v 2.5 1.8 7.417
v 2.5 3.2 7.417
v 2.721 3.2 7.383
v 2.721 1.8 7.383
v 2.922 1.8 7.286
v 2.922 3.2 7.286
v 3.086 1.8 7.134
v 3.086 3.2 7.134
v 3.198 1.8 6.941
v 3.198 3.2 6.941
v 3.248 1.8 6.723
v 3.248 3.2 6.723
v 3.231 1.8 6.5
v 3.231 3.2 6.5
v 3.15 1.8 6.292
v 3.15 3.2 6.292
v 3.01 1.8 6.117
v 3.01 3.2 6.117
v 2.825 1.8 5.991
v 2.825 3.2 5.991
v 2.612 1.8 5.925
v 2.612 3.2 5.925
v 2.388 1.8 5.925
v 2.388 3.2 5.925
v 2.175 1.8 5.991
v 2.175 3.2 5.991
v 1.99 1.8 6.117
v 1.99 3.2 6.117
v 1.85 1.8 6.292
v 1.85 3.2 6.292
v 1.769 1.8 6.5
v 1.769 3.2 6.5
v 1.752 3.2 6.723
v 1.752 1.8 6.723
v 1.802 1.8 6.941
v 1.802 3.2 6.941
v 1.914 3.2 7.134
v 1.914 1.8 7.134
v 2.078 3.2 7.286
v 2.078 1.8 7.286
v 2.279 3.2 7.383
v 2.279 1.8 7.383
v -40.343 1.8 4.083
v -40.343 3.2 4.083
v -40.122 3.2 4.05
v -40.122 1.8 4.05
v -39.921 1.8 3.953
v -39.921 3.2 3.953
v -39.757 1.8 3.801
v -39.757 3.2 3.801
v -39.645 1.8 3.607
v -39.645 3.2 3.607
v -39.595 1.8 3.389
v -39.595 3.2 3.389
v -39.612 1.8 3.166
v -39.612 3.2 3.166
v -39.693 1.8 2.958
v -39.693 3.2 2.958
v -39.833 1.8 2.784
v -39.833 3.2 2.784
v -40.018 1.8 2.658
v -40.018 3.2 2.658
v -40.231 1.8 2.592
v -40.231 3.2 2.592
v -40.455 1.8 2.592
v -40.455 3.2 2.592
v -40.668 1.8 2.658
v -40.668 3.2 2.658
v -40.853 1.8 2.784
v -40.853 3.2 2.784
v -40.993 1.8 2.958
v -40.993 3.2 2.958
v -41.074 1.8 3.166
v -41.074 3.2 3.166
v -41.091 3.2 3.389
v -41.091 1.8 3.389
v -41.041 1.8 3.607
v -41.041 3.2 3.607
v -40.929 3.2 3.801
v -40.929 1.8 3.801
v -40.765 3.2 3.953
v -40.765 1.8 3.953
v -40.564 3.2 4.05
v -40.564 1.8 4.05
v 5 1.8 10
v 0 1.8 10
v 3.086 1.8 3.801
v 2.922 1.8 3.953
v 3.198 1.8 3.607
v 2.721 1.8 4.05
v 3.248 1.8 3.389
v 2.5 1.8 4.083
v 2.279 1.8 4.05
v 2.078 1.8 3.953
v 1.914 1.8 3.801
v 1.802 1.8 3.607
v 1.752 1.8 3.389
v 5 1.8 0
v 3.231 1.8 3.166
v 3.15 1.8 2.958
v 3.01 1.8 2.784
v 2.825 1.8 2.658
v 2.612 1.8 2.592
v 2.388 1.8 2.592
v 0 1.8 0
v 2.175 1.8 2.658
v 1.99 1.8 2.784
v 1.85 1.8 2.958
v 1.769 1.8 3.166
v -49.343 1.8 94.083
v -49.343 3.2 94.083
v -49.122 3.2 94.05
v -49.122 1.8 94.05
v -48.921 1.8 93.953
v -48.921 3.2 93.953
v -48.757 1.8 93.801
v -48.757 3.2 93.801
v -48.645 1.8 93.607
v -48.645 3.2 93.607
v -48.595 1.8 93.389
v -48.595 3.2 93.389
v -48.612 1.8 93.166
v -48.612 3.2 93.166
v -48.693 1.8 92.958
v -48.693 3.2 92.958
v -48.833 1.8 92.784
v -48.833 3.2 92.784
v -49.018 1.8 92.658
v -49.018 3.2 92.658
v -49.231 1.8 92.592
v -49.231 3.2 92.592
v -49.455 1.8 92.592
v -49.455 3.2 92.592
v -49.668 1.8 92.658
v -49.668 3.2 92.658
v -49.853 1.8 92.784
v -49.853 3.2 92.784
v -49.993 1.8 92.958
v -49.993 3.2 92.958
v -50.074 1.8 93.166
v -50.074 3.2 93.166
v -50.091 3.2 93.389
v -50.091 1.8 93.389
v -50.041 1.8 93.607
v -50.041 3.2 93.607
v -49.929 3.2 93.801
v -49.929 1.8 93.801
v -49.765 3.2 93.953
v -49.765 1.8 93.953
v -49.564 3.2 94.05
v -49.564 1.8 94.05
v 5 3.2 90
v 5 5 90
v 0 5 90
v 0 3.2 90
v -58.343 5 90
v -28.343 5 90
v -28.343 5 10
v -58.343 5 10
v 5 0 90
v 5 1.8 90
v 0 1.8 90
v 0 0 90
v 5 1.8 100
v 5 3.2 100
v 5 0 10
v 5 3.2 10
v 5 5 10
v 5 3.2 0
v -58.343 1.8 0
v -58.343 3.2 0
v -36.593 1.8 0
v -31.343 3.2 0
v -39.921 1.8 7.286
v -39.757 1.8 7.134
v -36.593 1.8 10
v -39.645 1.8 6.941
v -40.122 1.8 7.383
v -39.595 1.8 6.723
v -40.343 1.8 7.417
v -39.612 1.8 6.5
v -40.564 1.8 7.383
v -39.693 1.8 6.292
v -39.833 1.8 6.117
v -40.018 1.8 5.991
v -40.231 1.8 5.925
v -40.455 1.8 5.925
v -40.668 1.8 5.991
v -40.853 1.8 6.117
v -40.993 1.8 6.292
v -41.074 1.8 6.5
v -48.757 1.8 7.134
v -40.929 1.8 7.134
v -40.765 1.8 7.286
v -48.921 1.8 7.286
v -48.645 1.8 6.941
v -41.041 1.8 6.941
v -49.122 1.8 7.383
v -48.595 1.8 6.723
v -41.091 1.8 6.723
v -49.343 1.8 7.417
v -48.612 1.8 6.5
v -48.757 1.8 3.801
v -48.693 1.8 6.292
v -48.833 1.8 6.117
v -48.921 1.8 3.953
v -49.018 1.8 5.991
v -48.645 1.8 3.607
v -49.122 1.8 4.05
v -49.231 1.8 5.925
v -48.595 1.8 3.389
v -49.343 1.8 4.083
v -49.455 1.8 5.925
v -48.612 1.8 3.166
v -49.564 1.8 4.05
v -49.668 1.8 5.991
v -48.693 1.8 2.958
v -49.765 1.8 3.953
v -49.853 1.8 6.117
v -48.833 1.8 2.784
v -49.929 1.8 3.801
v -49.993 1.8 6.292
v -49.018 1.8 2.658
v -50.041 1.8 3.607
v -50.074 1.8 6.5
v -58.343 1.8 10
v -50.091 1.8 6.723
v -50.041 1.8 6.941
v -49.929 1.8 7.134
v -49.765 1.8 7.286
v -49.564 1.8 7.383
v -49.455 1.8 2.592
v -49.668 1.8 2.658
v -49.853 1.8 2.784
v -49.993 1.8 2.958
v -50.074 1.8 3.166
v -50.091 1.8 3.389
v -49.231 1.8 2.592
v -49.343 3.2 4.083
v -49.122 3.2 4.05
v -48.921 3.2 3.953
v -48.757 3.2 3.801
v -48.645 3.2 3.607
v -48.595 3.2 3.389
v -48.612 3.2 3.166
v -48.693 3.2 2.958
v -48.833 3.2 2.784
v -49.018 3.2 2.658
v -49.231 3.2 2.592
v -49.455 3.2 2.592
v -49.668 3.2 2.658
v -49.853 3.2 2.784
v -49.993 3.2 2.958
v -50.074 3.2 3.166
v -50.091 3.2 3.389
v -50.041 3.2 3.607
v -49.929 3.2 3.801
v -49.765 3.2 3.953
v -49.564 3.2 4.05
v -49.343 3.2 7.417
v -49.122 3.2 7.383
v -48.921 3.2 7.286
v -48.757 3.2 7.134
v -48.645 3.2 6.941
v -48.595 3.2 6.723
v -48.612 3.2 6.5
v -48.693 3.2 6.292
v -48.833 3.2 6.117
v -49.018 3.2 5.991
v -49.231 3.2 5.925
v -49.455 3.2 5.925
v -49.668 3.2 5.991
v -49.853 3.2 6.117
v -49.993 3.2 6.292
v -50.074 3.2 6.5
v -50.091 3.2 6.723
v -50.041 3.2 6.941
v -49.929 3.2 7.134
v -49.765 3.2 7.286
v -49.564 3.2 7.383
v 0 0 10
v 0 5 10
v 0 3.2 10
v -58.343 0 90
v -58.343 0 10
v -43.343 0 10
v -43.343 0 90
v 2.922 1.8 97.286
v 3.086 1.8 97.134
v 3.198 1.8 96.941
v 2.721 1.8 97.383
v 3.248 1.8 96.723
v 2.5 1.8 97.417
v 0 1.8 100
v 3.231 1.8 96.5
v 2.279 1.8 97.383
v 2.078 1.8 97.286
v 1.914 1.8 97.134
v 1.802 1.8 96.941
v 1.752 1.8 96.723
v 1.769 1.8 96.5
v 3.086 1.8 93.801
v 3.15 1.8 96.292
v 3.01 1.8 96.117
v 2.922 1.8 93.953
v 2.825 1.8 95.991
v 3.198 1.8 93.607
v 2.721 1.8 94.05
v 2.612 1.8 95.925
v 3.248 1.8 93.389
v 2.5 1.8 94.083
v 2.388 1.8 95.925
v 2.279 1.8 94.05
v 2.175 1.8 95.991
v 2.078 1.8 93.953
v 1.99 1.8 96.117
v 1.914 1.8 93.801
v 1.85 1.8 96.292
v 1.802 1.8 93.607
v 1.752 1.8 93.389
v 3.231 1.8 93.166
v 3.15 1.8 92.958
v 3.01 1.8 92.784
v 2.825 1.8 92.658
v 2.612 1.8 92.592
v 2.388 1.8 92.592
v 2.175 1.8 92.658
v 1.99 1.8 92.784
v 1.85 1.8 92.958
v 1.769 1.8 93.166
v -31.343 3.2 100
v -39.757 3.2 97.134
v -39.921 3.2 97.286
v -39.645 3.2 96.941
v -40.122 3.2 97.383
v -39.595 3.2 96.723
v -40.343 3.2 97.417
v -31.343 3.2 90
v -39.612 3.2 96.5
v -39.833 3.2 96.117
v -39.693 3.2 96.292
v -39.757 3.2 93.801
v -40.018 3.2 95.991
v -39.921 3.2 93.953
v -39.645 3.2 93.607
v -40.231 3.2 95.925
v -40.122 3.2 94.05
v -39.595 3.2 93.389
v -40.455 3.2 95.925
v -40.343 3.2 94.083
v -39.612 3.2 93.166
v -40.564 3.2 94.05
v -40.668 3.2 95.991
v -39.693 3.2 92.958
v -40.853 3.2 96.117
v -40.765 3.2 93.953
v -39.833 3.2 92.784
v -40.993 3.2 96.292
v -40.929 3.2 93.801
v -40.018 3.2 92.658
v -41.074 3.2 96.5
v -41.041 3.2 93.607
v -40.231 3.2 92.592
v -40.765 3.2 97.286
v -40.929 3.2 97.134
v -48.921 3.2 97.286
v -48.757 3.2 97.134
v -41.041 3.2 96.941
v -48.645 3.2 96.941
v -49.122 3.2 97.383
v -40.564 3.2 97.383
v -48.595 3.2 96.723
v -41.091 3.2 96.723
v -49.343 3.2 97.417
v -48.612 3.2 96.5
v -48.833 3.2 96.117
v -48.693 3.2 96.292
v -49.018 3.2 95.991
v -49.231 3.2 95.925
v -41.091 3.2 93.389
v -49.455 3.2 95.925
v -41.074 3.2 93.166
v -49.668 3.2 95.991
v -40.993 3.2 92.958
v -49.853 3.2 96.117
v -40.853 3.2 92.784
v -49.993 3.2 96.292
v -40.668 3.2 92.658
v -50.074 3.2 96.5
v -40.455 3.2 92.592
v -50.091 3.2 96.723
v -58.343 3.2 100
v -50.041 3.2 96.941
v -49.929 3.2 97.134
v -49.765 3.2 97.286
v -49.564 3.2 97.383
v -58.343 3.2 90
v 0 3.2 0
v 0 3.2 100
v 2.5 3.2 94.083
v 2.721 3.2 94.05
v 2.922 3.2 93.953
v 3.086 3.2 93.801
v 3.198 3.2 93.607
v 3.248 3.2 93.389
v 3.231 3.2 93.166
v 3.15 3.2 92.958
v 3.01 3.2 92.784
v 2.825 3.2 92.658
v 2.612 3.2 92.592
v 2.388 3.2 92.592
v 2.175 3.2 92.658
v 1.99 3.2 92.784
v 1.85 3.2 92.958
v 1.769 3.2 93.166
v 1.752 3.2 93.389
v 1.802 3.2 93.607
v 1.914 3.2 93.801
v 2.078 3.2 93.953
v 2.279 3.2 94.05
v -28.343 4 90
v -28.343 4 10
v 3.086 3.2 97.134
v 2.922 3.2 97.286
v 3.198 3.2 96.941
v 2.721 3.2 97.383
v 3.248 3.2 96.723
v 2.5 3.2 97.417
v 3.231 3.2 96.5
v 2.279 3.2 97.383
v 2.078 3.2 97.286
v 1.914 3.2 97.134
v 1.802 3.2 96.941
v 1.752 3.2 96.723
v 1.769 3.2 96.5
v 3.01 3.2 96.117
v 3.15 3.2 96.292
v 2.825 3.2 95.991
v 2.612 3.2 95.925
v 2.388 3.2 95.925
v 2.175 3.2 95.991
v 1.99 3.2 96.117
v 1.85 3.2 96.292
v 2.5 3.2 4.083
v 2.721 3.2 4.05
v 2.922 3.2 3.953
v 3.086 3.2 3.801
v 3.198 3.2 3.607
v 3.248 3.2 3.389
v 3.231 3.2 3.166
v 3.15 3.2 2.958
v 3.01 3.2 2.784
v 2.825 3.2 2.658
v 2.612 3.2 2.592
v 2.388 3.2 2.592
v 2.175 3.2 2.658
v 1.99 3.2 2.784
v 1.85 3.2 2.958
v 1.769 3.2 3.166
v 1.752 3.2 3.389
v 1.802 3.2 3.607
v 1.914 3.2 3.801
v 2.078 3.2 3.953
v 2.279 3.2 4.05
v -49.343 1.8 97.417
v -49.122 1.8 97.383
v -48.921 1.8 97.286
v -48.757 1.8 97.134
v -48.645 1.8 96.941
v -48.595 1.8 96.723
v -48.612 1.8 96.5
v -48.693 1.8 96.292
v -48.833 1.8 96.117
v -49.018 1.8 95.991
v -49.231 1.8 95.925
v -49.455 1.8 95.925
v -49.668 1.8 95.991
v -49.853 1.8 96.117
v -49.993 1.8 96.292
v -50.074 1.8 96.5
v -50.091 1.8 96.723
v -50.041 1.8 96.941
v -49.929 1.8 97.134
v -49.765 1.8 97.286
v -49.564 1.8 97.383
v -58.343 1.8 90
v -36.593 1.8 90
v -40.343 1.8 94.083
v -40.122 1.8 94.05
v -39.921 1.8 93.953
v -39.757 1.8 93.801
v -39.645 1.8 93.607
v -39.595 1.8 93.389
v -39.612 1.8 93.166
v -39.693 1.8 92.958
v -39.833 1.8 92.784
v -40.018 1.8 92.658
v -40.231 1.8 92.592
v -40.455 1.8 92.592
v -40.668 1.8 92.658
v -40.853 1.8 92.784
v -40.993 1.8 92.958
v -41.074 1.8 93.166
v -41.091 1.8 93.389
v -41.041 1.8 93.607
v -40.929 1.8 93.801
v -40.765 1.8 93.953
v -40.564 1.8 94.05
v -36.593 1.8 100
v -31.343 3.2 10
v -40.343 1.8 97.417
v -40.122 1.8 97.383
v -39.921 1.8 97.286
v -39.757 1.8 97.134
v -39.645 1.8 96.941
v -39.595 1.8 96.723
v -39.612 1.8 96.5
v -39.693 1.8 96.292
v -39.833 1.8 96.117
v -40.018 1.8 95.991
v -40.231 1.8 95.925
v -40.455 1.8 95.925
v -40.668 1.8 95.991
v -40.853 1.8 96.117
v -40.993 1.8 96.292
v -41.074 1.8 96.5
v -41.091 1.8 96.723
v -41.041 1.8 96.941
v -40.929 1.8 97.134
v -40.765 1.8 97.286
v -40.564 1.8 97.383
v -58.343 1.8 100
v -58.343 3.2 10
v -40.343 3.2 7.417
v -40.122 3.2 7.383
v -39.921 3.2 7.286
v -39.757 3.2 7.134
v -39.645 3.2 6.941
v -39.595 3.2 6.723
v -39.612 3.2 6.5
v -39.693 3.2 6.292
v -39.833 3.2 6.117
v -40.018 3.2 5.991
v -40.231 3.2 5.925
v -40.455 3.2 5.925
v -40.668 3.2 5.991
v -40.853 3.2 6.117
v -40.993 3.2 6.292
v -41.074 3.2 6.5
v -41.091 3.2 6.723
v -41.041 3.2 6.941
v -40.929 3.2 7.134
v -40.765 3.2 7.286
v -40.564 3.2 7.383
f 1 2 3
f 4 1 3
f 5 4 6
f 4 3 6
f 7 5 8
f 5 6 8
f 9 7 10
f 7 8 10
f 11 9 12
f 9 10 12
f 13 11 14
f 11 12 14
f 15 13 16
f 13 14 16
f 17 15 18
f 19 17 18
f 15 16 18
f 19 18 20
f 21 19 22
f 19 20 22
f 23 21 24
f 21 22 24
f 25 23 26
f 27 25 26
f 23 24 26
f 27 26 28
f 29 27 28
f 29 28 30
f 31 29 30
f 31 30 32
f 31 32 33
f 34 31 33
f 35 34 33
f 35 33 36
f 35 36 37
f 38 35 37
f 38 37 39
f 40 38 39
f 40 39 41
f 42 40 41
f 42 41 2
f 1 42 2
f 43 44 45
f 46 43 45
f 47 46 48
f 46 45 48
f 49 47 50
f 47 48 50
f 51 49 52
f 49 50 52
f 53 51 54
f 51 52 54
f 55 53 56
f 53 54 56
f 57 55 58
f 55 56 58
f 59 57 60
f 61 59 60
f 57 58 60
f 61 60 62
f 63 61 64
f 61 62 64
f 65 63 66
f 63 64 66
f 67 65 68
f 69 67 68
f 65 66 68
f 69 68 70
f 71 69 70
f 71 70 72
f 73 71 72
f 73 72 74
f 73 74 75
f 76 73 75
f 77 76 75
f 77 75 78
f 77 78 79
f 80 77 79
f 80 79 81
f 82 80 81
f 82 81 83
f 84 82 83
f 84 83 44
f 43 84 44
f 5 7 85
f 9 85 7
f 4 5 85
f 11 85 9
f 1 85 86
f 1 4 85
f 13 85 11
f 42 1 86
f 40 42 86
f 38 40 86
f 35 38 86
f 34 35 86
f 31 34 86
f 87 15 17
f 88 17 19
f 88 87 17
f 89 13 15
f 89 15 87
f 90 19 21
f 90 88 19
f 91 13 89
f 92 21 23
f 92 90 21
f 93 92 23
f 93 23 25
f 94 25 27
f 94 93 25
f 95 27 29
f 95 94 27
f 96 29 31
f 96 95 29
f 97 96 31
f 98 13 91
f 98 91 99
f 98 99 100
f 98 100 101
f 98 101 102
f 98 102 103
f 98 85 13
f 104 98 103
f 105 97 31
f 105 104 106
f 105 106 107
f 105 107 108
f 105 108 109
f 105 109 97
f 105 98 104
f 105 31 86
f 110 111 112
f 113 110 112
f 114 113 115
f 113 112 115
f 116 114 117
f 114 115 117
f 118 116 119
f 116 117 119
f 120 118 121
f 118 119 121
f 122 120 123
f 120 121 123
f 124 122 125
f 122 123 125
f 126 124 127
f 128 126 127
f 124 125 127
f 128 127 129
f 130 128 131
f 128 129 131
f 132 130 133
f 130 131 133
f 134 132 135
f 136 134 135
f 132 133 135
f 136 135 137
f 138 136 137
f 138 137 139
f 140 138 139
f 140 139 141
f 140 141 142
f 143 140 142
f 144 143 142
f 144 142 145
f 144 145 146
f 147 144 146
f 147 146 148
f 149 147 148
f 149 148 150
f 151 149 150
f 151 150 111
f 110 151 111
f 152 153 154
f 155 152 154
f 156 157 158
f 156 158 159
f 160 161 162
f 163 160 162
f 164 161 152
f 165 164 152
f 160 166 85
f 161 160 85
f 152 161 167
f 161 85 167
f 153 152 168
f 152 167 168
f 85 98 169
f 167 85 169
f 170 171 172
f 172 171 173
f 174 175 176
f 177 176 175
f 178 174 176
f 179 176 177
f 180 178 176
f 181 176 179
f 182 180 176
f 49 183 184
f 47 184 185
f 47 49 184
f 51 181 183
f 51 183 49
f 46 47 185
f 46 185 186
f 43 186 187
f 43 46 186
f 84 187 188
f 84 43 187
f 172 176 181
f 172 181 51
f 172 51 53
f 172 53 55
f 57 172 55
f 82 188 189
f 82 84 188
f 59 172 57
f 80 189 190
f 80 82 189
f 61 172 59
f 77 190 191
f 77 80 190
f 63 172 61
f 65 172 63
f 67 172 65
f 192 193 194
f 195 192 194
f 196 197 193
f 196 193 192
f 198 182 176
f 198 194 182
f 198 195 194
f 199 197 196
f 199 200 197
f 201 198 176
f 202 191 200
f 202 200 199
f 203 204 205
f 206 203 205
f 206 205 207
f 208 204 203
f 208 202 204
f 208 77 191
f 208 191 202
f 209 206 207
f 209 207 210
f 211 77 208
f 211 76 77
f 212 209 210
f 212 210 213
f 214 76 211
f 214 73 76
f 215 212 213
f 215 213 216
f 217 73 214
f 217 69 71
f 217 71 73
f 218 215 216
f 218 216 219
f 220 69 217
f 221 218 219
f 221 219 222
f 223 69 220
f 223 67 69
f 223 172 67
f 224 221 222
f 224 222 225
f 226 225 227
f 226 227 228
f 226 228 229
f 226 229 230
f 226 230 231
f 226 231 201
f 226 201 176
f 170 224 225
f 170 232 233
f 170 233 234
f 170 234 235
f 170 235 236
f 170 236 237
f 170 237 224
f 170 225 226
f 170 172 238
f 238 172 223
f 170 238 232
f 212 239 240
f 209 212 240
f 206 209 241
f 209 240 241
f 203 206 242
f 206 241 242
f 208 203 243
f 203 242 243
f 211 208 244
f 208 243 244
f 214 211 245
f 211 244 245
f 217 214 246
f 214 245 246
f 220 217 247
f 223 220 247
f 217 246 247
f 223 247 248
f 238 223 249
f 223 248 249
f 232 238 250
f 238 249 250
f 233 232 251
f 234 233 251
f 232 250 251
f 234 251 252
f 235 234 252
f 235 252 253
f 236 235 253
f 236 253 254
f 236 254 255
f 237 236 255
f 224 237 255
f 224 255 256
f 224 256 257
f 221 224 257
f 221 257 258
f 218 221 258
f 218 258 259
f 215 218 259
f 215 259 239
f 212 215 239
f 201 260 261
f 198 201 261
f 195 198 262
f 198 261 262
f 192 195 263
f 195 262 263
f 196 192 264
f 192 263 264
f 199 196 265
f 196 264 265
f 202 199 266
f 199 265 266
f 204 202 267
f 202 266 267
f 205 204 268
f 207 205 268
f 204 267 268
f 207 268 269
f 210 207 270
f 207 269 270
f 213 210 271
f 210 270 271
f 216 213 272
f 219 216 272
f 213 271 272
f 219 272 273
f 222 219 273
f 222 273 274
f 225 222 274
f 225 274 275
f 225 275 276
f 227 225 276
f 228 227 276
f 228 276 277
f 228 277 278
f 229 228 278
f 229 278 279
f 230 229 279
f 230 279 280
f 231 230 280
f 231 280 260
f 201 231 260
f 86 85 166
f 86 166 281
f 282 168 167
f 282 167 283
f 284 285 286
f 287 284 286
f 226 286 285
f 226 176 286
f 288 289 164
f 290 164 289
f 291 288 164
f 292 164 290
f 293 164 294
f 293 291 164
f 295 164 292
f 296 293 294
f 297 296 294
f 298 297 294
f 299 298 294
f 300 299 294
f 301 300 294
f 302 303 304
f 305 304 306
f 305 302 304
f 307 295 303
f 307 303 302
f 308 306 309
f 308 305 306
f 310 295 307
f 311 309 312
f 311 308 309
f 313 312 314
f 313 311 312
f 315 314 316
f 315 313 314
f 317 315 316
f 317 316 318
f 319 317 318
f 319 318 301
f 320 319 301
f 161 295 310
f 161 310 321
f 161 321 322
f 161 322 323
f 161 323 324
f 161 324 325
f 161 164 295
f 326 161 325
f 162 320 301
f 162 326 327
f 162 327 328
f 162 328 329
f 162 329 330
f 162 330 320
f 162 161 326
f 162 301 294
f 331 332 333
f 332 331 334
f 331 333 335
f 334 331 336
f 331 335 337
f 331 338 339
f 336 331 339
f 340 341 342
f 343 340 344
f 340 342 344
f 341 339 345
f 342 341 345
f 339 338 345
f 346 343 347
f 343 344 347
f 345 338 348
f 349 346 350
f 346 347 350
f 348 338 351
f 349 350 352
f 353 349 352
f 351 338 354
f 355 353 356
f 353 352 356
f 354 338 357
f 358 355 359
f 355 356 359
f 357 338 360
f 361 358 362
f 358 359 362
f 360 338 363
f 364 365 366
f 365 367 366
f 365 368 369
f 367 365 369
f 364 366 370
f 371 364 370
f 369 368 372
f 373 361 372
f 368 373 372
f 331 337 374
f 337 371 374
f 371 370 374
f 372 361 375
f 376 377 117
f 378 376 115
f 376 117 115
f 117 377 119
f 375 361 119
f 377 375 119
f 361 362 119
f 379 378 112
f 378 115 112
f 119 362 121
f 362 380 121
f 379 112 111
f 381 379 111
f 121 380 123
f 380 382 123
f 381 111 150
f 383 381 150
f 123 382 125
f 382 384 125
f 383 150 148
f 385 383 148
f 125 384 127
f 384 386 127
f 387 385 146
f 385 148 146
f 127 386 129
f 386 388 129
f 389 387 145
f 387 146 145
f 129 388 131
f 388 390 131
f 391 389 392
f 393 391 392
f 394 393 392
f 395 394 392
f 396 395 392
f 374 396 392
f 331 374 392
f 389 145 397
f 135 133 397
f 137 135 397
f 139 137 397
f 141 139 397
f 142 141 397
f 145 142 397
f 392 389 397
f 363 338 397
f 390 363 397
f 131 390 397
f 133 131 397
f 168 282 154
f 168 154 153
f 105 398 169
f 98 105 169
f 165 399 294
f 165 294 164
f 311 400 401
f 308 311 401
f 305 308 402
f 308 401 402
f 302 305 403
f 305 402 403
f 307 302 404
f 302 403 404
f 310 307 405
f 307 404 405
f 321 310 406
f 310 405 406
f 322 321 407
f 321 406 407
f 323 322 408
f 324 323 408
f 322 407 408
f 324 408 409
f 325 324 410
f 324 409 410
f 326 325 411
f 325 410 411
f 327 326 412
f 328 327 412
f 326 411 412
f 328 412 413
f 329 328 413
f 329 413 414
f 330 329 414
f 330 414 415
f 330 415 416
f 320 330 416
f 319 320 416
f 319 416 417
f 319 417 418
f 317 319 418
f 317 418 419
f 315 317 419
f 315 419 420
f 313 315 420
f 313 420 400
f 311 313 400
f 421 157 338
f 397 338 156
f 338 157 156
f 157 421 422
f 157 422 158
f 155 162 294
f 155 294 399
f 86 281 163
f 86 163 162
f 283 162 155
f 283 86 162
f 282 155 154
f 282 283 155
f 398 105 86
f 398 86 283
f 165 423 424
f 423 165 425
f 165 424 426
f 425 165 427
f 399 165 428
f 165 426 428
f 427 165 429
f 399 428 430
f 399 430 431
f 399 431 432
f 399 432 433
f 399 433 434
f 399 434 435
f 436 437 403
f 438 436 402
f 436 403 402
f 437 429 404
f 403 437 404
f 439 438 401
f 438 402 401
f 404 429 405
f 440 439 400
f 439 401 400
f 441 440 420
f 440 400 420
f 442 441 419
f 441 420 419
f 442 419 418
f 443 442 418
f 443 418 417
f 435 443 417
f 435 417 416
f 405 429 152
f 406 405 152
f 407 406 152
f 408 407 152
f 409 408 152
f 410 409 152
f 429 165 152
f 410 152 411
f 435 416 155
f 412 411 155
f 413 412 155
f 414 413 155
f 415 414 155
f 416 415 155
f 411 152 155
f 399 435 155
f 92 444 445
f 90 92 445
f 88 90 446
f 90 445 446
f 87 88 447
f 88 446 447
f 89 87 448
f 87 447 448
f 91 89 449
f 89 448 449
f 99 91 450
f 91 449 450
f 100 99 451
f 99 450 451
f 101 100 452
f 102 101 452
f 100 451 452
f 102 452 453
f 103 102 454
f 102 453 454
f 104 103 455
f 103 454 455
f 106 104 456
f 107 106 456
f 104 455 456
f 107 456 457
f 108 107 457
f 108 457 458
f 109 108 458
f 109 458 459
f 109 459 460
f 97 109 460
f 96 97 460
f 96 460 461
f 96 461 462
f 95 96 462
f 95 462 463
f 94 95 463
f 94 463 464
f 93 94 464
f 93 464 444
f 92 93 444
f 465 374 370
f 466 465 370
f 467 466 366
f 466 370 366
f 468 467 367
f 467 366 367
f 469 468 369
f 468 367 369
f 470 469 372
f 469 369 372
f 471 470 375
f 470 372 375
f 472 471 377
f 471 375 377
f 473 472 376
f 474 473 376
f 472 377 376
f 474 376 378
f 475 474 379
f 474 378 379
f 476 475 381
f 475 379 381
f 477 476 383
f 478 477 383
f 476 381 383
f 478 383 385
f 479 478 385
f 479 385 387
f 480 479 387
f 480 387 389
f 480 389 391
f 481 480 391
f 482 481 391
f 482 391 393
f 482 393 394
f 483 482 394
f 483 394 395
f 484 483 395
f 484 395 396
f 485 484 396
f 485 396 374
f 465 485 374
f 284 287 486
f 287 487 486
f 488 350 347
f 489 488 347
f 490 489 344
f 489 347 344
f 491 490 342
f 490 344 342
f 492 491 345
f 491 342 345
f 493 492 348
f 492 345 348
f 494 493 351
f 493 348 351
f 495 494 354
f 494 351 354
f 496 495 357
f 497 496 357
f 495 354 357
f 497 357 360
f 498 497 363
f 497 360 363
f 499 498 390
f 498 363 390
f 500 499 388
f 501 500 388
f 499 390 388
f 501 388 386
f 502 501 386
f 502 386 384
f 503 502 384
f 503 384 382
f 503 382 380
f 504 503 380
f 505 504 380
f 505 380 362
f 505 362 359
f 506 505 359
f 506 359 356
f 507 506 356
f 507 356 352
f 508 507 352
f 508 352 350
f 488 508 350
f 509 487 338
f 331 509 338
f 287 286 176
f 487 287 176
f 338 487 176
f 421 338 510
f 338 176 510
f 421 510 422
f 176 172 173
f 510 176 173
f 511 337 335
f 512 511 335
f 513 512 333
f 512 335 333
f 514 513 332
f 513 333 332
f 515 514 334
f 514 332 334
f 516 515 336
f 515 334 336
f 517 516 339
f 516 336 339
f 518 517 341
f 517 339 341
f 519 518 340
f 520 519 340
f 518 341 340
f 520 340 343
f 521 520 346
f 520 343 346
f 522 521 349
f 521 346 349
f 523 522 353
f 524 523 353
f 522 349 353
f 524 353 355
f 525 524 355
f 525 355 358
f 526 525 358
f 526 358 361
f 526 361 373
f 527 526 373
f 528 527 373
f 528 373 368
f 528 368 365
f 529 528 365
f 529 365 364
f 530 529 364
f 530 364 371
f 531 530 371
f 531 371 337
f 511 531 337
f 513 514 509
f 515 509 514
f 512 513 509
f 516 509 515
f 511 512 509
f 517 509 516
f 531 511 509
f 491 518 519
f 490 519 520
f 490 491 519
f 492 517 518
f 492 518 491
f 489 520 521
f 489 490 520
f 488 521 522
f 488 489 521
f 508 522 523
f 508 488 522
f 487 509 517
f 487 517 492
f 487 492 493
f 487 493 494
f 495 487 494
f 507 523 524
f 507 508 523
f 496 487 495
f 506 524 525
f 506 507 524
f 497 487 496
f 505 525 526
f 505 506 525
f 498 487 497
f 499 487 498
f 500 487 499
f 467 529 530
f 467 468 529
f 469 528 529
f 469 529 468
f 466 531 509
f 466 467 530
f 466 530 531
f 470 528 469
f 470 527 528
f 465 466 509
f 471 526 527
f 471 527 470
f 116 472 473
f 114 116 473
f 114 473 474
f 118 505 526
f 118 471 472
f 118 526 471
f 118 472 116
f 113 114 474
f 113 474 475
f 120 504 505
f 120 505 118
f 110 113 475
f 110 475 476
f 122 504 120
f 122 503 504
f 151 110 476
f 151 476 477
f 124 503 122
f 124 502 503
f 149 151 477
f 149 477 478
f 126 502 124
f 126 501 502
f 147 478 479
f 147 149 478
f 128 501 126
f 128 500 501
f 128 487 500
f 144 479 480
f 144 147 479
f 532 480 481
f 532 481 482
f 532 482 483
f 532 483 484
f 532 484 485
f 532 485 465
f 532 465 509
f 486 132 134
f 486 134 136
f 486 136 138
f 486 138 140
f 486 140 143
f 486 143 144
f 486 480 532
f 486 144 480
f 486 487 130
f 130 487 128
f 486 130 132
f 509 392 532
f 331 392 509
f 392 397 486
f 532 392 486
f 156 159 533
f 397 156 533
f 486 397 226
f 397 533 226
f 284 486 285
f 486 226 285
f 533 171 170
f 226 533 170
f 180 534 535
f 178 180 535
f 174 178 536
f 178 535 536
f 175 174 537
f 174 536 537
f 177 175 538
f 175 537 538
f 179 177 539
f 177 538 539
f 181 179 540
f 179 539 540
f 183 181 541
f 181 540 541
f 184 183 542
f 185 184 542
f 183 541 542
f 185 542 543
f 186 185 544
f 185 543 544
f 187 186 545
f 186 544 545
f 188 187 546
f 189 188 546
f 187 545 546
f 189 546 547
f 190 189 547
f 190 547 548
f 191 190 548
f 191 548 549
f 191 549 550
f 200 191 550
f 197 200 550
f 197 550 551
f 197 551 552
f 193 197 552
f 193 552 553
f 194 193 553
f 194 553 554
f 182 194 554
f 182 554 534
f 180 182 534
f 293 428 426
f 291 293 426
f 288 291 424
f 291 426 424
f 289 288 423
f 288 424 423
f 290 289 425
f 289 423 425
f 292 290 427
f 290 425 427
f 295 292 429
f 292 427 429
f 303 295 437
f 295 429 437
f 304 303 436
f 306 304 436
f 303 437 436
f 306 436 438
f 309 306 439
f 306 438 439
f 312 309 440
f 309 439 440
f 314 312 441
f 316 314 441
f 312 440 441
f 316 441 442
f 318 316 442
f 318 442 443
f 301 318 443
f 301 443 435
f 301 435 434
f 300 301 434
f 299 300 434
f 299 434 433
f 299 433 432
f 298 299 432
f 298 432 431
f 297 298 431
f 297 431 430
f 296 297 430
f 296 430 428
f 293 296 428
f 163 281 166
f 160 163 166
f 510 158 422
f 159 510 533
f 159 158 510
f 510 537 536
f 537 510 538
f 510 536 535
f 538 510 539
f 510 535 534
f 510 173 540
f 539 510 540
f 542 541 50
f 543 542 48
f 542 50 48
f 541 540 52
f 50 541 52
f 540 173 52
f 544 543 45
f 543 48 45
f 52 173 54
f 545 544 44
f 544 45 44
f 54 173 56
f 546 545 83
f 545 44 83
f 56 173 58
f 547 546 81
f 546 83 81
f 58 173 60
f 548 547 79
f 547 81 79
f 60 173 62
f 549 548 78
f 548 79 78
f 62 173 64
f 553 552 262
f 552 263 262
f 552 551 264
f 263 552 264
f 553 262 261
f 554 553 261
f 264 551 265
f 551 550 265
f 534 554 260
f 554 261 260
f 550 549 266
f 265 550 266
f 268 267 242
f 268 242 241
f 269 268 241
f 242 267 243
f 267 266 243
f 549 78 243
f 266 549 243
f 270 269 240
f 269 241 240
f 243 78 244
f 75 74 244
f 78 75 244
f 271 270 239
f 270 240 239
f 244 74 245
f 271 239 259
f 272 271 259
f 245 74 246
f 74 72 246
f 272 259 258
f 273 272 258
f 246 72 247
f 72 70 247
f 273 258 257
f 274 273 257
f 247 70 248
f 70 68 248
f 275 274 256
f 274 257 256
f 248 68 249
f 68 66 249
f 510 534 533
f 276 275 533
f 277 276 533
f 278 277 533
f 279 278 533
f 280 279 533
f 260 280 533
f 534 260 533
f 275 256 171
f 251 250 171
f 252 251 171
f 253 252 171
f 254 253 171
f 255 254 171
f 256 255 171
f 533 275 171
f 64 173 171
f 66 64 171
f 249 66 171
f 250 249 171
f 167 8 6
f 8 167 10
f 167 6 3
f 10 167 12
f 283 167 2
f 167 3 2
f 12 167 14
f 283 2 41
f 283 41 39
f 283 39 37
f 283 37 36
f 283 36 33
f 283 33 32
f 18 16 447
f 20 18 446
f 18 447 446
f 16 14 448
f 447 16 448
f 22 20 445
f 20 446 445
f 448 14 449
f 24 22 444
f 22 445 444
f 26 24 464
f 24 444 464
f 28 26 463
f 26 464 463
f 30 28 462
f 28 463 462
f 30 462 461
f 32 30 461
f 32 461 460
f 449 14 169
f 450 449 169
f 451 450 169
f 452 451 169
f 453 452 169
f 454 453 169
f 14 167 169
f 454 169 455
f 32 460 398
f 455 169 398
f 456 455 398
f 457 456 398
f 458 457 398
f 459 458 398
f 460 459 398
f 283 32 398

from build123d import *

# Parameters (mm, degrees)
AUFSATZ_LINEAR_AUSTRAGEN1_DEPTH   = 100
SKIZZE1_W                         = 5
SKIZZE1_H                         = 5
AUFSATZ_LINEAR_AUSTRAGEN1_2_DEPTH = 100
SKIZZE3_W                         = 63.343006578
SKIZZE3_H                         = 1.8
SCHNITT_LINEAR_AUSTRAGEN2_DEPTH   = 10
SCHNITT_LINEAR_START              = -90
SKIZZE3_3_W                       = 63.343006578
SKIZZE3_3_H                       = 1.8
SCHNITT_LINEAR_AUSTRAGEN3_DEPTH   = 10
SKIZZE4_R                         = 0.75
SCHNITT_LINEAR_AUSTRAGEN4_DEPTH   = 3.2
LINEARES_MUSTER1_COUNT            = 2
LINEARES_MUSTER1_PITCH            = 90


with BuildPart() as part:
    # Skizze1 → Aufsatz-Linear austragen1 (new body)
    with BuildSketch(Plane.XY):
        Polygon((-43.343006578, 0), (-28.343006578, 4), (-28.343006578, 5), (-58.343006578, 5), (-58.343006578, 0), align=None)
    extrude(amount=AUFSATZ_LINEAR_AUSTRAGEN1_DEPTH)


with BuildPart() as body_2:
    # Skizze1 → Aufsatz-Linear austragen1 2 (new body)
    with BuildSketch(Plane.XY):
        with Locations((2.5, 2.5)):
            Rectangle(SKIZZE1_W, SKIZZE1_H)
    extrude(amount=AUFSATZ_LINEAR_AUSTRAGEN1_2_DEPTH)


with BuildPart() as schnitt_linear_austragen2_tool:
    # Skizze3 → Schnitt-Linear austragen2 (new body)
    with BuildSketch(Plane(origin=(0, 0, 0), x_dir=(-1, 0, 0), z_dir=(0, 0, -1))):
        with Locations((26.671503289, 4.1)):
            Rectangle(SKIZZE3_W, SKIZZE3_H)
        with Locations((26.671503289, 0.9)):
            Rectangle(SKIZZE3_W, SKIZZE3_H)
    extrude(amount=-SCHNITT_LINEAR_AUSTRAGEN2_DEPTH)


with BuildPart() as part_1:
    add(part.part)

    # Schnitt-Linear austragen2: cut by schnitt_linear_austragen2_tool
    add(schnitt_linear_austragen2_tool.part, mode=Mode.SUBTRACT)


with BuildPart() as body_2_1:
    add(body_2.part)

    # Schnitt-Linear austragen2: cut by schnitt_linear_austragen2_tool
    add(schnitt_linear_austragen2_tool.part, mode=Mode.SUBTRACT)


with BuildPart() as schnitt_linear_austragen3_tool:
    # Skizze3<3> → Schnitt-Linear austragen3 (new body)
    with BuildSketch(Plane(origin=(0, 0, 0), x_dir=(-1, 0, 0), z_dir=(0, 0, -1)).offset(SCHNITT_LINEAR_START)):
        with Locations((26.671503289, 4.1)):
            Rectangle(SKIZZE3_3_W, SKIZZE3_3_H)
        with Locations((26.671503289, 0.9)):
            Rectangle(SKIZZE3_3_W, SKIZZE3_3_H)
    extrude(amount=-SCHNITT_LINEAR_AUSTRAGEN3_DEPTH)


with BuildPart() as part_2:
    add(part_1.part)

    # Schnitt-Linear austragen3: cut by schnitt_linear_austragen3_tool
    add(schnitt_linear_austragen3_tool.part, mode=Mode.SUBTRACT)


with BuildPart() as body_2_2:
    add(body_2_1.part)

    # Schnitt-Linear austragen3: cut by schnitt_linear_austragen3_tool
    add(schnitt_linear_austragen3_tool.part, mode=Mode.SUBTRACT)


with BuildPart() as schnitt_linear_austragen4_tool:
    # Skizze4 → Schnitt-Linear austragen4 (new body)
    with BuildSketch(Plane(origin=(0, 5, 0), x_dir=(1, 0, 0), z_dir=(0, 1, 0))):
        with Locations(Location((-49.343006578, -3.333333333, 0), (0, 0, 270))):
            Circle(SKIZZE4_R)
        with Locations(Location((-49.343006578, -6.666666667, 0), (0, 0, 270))):
            Circle(SKIZZE4_R)
        with Locations(Location((-40.343006578, -3.333333333, 0), (0, 0, 270))):
            Circle(SKIZZE4_R)
        with Locations(Location((-40.343006578, -6.666666667, 0), (0, 0, 270))):
            Circle(SKIZZE4_R)
        with Locations(Location((2.5, -3.333333333, 0), (0, 0, 270))):
            Circle(SKIZZE4_R)
        with Locations(Location((2.5, -6.666666667, 0), (0, 0, 270))):
            Circle(SKIZZE4_R)
    schnitt_linear_austragen4 = extrude(amount=-SCHNITT_LINEAR_AUSTRAGEN4_DEPTH)


with BuildPart() as part_3:
    add(part_2.part)

    # Schnitt-Linear austragen4: cut by schnitt_linear_austragen4_tool
    add(schnitt_linear_austragen4_tool.part, mode=Mode.SUBTRACT)


with BuildPart() as body_2_3:
    add(body_2_2.part)

    # Schnitt-Linear austragen4: cut by schnitt_linear_austragen4_tool
    add(schnitt_linear_austragen4_tool.part, mode=Mode.SUBTRACT)


with BuildPart() as lineares_muster1_tool:
    # Lineares Muster1: Schnitt-Linear austragen4 ×2
    with Locations(*[(0, 0, i * LINEARES_MUSTER1_PITCH) for i in range(1, LINEARES_MUSTER1_COUNT)]):
        add(schnitt_linear_austragen4)


with BuildPart() as part_4:
    add(part_3.part)

    # Lineares Muster1: cut by lineares_muster1_tool
    add(lineares_muster1_tool.part, mode=Mode.SUBTRACT)


with BuildPart() as body_2_4:
    add(body_2_3.part)

    # Lineares Muster1: cut by lineares_muster1_tool
    add(lineares_muster1_tool.part, mode=Mode.SUBTRACT)


solid = Compound([part_4.part, body_2_4.part])
